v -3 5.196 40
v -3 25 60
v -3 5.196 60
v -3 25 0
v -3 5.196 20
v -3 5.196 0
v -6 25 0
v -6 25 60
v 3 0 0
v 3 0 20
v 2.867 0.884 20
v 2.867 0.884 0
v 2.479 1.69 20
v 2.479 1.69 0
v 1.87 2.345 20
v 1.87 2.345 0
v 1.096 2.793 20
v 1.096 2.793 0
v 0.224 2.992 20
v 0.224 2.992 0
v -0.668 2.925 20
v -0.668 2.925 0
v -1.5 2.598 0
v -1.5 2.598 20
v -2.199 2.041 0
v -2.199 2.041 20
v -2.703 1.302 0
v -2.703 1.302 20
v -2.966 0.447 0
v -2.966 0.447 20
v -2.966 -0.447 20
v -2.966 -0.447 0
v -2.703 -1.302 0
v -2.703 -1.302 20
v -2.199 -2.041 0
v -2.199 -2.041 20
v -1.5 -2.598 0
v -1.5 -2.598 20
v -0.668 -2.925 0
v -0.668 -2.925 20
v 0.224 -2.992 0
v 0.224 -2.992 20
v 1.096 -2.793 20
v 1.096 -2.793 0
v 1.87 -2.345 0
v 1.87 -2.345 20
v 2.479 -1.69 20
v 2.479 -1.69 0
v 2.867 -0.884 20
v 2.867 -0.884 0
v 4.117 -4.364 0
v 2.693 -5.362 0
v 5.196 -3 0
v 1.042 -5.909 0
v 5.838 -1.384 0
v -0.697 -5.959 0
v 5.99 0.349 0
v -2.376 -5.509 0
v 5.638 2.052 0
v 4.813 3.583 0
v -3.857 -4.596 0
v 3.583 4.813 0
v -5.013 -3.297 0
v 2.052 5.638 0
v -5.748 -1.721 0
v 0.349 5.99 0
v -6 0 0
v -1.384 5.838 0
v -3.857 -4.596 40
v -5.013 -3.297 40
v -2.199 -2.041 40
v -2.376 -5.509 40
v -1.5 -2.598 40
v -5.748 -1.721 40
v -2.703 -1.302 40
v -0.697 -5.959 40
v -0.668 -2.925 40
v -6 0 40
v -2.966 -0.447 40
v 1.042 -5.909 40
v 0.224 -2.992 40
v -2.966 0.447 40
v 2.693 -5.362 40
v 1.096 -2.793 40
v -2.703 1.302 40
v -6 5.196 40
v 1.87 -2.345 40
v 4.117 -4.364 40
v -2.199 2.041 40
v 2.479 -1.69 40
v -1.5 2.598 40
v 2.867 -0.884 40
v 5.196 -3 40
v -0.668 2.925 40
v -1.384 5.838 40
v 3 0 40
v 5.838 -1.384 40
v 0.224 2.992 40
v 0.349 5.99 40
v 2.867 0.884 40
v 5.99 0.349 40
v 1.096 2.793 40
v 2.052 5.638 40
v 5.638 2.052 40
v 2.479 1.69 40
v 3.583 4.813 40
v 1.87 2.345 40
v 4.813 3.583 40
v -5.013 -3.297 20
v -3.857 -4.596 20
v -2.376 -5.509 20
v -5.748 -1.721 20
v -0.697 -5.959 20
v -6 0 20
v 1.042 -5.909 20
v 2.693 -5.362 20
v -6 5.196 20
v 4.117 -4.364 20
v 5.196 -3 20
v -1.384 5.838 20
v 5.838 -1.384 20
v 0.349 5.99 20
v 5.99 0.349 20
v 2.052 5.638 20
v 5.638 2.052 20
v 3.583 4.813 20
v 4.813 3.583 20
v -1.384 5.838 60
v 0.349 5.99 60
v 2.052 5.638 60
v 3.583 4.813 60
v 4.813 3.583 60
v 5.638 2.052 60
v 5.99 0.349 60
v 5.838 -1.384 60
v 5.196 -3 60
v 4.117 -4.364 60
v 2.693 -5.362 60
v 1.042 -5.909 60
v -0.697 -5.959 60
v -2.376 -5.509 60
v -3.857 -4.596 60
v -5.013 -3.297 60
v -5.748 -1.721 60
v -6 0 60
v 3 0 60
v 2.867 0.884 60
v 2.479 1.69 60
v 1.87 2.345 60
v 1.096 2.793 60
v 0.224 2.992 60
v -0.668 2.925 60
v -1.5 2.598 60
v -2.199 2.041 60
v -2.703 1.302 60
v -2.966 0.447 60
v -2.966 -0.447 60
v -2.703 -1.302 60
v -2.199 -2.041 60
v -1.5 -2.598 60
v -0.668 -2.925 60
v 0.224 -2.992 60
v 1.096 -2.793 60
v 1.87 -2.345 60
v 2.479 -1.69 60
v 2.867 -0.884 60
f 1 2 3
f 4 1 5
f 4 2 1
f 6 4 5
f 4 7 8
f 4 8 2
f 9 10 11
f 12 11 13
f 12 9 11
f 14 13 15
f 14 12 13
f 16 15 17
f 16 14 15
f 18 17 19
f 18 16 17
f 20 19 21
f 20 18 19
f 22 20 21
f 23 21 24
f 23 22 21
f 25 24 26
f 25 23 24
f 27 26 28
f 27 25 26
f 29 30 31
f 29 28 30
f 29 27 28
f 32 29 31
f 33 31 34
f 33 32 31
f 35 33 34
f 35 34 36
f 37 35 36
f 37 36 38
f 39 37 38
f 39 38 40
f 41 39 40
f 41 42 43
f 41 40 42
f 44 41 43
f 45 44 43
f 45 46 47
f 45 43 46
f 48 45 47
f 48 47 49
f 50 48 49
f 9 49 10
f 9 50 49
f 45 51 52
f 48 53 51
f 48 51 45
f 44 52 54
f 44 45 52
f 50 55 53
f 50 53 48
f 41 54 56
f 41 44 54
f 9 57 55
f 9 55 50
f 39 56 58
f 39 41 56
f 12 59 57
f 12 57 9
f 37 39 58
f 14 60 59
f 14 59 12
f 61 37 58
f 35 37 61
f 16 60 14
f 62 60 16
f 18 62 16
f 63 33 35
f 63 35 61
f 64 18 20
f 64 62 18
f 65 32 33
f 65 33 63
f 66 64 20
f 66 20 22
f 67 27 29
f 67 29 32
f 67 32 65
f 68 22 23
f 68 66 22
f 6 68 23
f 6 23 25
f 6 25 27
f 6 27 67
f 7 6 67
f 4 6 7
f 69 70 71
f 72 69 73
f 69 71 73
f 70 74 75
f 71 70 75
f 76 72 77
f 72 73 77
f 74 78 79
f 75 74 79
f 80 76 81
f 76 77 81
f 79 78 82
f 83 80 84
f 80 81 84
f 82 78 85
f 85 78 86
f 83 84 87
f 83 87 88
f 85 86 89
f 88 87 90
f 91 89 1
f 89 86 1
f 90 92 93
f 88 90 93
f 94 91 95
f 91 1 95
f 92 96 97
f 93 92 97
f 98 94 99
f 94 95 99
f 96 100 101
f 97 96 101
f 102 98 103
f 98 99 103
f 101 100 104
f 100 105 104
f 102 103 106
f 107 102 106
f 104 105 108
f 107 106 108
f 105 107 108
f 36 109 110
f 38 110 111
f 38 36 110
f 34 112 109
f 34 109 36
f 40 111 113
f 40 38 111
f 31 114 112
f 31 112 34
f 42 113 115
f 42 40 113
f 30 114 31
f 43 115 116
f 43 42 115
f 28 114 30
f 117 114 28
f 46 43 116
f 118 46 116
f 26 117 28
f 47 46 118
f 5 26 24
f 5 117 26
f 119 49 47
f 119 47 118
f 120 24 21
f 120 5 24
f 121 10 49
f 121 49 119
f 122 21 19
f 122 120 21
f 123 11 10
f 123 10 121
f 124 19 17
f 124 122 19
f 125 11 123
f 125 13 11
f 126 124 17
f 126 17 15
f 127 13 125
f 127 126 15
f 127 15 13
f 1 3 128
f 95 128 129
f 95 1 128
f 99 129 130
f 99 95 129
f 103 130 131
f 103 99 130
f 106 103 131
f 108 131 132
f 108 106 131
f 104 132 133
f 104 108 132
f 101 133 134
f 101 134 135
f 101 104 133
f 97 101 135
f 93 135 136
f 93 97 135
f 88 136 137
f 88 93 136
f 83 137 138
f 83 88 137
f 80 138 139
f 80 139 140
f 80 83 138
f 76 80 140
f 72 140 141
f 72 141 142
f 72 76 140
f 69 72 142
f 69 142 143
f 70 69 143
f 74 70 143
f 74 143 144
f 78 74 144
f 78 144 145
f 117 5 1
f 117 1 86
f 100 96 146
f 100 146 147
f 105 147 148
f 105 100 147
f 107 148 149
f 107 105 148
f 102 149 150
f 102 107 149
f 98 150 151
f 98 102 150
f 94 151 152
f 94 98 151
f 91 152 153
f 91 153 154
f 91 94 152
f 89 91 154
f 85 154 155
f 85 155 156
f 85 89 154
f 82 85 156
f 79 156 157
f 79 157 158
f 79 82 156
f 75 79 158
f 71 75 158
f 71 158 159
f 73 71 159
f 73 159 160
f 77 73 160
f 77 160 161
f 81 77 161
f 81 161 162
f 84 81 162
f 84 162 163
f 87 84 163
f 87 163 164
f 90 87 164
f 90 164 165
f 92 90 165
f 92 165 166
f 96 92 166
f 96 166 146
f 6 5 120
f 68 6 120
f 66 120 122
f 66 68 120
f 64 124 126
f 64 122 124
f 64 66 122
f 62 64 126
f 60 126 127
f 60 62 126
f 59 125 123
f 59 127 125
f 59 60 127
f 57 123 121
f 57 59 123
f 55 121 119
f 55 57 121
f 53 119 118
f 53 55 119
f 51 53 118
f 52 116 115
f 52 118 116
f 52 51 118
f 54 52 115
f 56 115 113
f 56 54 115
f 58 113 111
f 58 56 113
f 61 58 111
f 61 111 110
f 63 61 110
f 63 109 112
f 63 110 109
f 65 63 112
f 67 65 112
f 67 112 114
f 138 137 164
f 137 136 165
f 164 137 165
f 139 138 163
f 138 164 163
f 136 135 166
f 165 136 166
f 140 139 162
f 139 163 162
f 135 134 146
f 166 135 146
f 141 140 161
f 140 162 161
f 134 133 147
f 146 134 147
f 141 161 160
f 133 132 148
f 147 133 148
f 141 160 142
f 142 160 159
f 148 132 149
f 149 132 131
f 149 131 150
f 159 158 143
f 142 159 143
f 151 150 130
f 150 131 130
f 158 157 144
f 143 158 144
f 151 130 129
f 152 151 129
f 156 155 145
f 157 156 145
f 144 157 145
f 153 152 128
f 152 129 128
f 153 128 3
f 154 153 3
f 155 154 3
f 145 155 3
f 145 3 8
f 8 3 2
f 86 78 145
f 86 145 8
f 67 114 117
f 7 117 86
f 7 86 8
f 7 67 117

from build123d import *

# Parameters (mm, degrees)
SKETCH2_R           = 3
BOSS_EXTRUDE1_DEPTH = 60
CUT_EXTRUDE1_DEPTH  = 20


with BuildPart() as part:
    # Sketch2 → Boss-Extrude1 (new body)
    with BuildSketch(Plane.XY):
        with BuildLine():
            Line((-6, 0), (-6, 25))
            Line((-6, 25), (-3, 25))
            Line((-3, 25), (-3, 5.196152423))
            ThreePointArc((-3, 5.196152423), (5.196152423, -3), (-6, 0))
        make_face()
        Circle(SKETCH2_R, mode=Mode.SUBTRACT)
    extrude(amount=BOSS_EXTRUDE1_DEPTH)

    # Sketch3 → Cut-Extrude1 (cut)
    with BuildSketch(Plane.XY.offset(20)):
        with BuildLine():
            Line((-3, 5.196152423), (-6, 5.196152423))
            Line((-6, 5.196152423), (-6, 0))
            ThreePointArc((-6, 0), (5.196152423, -3), (-3, 5.196152423))
        make_face()
    extrude(amount=CUT_EXTRUDE1_DEPTH, mode=Mode.SUBTRACT)


solid = part.part
